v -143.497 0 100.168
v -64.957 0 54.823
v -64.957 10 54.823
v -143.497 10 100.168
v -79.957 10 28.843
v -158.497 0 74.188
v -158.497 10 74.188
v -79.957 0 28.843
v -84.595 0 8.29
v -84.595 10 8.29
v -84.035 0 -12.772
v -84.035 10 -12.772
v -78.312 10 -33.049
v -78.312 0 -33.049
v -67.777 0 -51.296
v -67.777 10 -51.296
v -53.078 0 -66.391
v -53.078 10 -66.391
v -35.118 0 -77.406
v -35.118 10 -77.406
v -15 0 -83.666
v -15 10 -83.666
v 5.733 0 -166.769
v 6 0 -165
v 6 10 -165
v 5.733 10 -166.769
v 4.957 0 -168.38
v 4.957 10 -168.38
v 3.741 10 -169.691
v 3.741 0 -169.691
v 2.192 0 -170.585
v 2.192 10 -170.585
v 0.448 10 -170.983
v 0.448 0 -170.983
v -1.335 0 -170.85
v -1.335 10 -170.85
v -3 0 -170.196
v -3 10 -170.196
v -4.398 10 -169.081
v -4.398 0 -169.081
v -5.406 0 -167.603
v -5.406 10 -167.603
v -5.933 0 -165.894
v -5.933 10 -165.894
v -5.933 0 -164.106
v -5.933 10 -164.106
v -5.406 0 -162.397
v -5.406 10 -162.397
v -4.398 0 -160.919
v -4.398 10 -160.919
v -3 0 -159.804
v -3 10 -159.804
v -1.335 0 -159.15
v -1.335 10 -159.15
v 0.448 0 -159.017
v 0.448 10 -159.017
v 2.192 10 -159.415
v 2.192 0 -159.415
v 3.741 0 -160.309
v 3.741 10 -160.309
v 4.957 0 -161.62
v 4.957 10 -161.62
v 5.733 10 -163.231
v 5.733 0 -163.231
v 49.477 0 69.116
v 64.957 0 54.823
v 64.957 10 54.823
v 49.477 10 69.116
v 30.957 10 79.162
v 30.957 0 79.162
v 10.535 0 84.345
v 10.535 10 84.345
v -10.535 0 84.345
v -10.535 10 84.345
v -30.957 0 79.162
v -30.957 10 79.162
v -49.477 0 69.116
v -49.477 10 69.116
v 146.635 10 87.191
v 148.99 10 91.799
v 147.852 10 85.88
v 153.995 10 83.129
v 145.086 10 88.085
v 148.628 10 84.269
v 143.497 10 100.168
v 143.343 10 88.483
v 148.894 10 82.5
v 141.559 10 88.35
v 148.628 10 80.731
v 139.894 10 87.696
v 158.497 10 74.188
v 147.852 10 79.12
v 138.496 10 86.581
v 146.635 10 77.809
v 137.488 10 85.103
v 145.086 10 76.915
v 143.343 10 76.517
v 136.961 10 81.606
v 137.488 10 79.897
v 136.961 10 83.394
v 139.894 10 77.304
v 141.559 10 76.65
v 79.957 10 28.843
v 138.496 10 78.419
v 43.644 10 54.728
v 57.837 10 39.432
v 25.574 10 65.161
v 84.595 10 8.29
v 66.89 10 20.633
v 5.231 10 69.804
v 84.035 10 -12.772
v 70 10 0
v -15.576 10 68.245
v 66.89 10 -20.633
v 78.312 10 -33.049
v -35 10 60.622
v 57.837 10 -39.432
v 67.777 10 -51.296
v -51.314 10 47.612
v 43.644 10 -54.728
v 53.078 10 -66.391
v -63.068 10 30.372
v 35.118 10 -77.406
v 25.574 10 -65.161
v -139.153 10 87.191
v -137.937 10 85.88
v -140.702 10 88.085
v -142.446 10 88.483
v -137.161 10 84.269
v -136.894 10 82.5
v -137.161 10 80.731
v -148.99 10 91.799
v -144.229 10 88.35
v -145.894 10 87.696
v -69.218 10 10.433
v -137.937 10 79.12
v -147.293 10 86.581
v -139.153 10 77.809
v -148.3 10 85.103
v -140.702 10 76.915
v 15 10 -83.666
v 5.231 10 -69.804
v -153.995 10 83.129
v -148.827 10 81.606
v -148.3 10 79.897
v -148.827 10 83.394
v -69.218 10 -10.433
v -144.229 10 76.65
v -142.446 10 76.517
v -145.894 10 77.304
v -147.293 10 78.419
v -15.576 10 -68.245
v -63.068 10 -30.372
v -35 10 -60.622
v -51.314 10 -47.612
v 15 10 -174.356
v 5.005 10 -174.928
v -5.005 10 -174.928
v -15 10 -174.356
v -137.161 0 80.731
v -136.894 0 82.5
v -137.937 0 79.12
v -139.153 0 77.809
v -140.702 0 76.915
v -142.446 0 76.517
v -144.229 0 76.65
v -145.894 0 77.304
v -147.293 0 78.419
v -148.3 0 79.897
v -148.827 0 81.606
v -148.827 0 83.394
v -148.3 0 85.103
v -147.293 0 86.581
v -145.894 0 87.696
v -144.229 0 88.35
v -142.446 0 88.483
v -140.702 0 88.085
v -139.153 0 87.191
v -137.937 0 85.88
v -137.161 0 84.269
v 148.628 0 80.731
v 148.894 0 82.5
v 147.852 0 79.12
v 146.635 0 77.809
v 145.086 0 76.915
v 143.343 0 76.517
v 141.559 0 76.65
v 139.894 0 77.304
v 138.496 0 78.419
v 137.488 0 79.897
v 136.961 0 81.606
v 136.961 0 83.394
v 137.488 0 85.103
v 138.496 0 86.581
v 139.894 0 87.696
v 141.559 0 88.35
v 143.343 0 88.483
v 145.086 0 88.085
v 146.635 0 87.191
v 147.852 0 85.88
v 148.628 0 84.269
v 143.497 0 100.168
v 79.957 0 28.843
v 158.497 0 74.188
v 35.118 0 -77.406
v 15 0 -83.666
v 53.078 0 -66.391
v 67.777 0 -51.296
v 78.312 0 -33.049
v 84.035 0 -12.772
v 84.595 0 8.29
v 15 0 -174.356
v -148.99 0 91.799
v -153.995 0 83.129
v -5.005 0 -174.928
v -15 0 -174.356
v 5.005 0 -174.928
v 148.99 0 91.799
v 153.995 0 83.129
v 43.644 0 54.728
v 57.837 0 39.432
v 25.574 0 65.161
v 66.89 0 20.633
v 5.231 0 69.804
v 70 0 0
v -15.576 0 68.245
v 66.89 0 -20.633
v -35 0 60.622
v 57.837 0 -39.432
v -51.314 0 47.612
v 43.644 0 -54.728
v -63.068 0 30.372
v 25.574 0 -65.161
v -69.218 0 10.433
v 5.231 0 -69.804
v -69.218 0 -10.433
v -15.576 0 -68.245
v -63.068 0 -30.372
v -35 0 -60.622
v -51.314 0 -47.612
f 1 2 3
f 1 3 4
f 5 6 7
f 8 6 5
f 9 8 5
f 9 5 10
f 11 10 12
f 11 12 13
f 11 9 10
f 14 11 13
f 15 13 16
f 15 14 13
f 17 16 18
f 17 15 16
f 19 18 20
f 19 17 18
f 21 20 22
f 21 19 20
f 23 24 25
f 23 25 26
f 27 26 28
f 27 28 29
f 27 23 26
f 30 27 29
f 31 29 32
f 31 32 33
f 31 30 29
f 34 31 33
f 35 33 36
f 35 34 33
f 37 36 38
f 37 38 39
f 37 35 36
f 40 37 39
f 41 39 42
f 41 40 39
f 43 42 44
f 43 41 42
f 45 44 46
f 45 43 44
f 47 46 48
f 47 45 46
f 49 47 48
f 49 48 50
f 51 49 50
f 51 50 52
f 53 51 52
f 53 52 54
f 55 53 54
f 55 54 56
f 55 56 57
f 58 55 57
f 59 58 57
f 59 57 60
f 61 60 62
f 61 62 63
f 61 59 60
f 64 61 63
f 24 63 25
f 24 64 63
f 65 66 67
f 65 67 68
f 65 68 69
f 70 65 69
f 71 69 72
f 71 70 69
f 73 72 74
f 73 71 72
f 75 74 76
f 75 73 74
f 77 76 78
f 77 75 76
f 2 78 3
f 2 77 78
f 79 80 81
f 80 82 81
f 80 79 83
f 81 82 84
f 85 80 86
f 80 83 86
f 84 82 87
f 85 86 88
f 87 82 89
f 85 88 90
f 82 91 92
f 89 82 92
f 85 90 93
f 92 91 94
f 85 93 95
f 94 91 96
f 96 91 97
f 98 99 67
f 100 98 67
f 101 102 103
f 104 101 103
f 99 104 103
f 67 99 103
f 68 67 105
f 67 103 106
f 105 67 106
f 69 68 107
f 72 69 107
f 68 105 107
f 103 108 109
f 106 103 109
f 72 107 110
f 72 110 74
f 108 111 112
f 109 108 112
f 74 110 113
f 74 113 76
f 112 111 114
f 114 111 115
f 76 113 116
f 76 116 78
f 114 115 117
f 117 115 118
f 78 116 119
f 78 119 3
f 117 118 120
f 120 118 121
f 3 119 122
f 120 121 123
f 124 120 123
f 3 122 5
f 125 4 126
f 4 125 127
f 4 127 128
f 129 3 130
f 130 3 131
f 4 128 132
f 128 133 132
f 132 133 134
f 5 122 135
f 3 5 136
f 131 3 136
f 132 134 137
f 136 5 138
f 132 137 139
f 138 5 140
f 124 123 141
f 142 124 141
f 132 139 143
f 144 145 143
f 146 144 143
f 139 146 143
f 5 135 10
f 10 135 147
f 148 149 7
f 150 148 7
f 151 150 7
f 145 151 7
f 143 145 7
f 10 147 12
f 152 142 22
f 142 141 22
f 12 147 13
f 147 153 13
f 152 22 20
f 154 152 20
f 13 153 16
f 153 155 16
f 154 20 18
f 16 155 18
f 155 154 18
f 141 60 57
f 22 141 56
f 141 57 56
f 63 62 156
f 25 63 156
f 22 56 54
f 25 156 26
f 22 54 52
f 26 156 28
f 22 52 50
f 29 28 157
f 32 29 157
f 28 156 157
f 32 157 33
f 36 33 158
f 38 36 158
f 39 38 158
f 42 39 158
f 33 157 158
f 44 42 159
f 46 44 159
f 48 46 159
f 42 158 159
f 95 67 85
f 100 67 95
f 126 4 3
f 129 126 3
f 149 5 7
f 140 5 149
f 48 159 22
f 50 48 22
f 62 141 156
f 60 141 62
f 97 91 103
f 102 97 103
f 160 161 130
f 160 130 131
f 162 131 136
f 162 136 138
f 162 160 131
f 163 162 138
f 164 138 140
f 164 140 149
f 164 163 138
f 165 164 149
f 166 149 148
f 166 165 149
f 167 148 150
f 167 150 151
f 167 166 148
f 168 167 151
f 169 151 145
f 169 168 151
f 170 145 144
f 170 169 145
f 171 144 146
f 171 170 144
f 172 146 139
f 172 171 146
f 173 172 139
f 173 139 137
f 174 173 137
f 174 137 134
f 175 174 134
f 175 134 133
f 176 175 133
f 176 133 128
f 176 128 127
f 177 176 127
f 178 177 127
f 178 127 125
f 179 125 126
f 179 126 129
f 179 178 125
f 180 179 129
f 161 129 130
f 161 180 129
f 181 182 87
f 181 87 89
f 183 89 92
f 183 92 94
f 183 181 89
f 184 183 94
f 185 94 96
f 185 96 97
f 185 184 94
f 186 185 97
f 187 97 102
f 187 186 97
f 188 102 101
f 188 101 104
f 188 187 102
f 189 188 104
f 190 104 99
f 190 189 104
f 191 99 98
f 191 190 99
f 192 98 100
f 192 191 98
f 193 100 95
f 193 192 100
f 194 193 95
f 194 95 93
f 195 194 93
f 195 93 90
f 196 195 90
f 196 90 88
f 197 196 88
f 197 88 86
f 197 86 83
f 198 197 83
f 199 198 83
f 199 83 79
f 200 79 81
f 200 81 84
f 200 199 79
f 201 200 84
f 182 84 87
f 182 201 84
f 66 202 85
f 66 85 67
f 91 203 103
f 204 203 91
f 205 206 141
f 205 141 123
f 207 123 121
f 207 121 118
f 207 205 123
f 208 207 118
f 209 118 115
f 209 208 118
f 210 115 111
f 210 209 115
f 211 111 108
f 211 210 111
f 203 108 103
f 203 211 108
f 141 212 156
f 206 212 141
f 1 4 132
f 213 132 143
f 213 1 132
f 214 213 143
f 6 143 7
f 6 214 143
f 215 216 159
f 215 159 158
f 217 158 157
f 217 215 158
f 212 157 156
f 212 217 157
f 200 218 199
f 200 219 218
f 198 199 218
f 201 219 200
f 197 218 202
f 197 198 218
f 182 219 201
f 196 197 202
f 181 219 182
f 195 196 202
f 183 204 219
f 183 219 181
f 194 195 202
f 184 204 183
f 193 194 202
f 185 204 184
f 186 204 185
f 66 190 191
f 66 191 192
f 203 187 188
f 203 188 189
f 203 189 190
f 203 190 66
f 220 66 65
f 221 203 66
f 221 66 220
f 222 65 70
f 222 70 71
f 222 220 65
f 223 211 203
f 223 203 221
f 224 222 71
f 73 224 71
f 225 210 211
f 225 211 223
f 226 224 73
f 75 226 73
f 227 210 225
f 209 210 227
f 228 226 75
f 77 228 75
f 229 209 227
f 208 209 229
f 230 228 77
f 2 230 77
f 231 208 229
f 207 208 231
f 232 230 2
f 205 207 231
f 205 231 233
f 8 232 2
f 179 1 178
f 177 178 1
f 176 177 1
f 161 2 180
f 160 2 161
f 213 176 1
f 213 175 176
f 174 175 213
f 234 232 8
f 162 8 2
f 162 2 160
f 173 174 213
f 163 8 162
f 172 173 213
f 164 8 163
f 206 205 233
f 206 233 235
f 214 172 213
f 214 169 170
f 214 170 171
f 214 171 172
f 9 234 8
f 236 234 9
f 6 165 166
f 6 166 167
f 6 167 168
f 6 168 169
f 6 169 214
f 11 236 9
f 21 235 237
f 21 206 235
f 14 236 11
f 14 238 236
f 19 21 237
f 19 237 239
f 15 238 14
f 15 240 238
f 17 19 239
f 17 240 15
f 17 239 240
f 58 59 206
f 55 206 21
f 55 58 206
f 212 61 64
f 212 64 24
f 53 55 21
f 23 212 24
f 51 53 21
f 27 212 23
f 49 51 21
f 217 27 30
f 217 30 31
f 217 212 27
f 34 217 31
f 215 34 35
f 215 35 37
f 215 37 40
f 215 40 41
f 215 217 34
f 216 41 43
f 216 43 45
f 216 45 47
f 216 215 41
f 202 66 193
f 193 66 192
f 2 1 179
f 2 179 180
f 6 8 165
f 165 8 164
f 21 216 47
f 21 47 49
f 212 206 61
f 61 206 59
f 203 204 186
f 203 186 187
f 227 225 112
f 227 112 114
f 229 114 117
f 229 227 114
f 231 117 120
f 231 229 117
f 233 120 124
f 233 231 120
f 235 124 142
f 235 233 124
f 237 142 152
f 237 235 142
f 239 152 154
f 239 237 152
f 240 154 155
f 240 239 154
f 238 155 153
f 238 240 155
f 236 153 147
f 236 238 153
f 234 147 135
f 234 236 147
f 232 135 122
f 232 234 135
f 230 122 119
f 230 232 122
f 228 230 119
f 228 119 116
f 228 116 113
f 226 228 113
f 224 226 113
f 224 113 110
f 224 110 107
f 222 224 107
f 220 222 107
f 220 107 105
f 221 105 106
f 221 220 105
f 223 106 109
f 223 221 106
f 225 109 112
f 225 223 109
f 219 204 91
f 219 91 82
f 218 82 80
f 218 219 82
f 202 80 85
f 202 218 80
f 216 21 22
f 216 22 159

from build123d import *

# Parameters (mm, degrees)
SKETCH_1_R      = 70
SKETCH_1_R_2    = 6
EXTRUDE_1_DEPTH = 10


with BuildPart() as part:
    # 草图1 → 凸台-拉伸1 (new body)
    with BuildSketch(Plane(origin=(0, 0, 0), x_dir=(1, 0, 0), z_dir=(0, 1, 0))):
        with BuildLine():
            Line((143.496688705, -100.168359928), (64.956883731, -54.823382383))
            ThreePointArc((64.956883731, -54.823382383), (0, -85), (-64.956883731, -54.823382383))
            Line((-64.956883731, -54.823382383), (-143.496688705, -100.168359928))
            ThreePointArc((-143.496688705, -100.168359928), (-151.554445662, -87.5), (-158.496688705, -74.187597814))
            Line((-158.496688705, -74.187597814), (-79.956883731, -28.84262027))
            ThreePointArc((-79.956883731, -28.84262027), (-73.612159322, 42.5), (-15, 83.666002653))
            Line((-15, 83.666002653), (-15, 174.355957742))
            ThreePointArc((-15, 174.355957742), (0, 175), (15, 174.355957742))
            Line((15, 174.355957742), (15, 83.666002653))
            ThreePointArc((15, 83.666002653), (73.612159322, 42.5), (79.956883731, -28.84262027))
            Line((79.956883731, -28.84262027), (158.496688705, -74.187597814))
            ThreePointArc((158.496688705, -74.187597814), (151.554445662, -87.5), (143.496688705, -100.168359928))
        make_face()
        Circle(SKETCH_1_R, mode=Mode.SUBTRACT)
        with Locations((0, 165)):
            Circle(SKETCH_1_R_2, mode=Mode.SUBTRACT)
        with Locations((142.894191624, -82.5)):
            Circle(SKETCH_1_R_2, mode=Mode.SUBTRACT)
        with Locations((-142.894191624, -82.5)):
            Circle(SKETCH_1_R_2, mode=Mode.SUBTRACT)
    extrude(amount=EXTRUDE_1_DEPTH)


solid = part.part
